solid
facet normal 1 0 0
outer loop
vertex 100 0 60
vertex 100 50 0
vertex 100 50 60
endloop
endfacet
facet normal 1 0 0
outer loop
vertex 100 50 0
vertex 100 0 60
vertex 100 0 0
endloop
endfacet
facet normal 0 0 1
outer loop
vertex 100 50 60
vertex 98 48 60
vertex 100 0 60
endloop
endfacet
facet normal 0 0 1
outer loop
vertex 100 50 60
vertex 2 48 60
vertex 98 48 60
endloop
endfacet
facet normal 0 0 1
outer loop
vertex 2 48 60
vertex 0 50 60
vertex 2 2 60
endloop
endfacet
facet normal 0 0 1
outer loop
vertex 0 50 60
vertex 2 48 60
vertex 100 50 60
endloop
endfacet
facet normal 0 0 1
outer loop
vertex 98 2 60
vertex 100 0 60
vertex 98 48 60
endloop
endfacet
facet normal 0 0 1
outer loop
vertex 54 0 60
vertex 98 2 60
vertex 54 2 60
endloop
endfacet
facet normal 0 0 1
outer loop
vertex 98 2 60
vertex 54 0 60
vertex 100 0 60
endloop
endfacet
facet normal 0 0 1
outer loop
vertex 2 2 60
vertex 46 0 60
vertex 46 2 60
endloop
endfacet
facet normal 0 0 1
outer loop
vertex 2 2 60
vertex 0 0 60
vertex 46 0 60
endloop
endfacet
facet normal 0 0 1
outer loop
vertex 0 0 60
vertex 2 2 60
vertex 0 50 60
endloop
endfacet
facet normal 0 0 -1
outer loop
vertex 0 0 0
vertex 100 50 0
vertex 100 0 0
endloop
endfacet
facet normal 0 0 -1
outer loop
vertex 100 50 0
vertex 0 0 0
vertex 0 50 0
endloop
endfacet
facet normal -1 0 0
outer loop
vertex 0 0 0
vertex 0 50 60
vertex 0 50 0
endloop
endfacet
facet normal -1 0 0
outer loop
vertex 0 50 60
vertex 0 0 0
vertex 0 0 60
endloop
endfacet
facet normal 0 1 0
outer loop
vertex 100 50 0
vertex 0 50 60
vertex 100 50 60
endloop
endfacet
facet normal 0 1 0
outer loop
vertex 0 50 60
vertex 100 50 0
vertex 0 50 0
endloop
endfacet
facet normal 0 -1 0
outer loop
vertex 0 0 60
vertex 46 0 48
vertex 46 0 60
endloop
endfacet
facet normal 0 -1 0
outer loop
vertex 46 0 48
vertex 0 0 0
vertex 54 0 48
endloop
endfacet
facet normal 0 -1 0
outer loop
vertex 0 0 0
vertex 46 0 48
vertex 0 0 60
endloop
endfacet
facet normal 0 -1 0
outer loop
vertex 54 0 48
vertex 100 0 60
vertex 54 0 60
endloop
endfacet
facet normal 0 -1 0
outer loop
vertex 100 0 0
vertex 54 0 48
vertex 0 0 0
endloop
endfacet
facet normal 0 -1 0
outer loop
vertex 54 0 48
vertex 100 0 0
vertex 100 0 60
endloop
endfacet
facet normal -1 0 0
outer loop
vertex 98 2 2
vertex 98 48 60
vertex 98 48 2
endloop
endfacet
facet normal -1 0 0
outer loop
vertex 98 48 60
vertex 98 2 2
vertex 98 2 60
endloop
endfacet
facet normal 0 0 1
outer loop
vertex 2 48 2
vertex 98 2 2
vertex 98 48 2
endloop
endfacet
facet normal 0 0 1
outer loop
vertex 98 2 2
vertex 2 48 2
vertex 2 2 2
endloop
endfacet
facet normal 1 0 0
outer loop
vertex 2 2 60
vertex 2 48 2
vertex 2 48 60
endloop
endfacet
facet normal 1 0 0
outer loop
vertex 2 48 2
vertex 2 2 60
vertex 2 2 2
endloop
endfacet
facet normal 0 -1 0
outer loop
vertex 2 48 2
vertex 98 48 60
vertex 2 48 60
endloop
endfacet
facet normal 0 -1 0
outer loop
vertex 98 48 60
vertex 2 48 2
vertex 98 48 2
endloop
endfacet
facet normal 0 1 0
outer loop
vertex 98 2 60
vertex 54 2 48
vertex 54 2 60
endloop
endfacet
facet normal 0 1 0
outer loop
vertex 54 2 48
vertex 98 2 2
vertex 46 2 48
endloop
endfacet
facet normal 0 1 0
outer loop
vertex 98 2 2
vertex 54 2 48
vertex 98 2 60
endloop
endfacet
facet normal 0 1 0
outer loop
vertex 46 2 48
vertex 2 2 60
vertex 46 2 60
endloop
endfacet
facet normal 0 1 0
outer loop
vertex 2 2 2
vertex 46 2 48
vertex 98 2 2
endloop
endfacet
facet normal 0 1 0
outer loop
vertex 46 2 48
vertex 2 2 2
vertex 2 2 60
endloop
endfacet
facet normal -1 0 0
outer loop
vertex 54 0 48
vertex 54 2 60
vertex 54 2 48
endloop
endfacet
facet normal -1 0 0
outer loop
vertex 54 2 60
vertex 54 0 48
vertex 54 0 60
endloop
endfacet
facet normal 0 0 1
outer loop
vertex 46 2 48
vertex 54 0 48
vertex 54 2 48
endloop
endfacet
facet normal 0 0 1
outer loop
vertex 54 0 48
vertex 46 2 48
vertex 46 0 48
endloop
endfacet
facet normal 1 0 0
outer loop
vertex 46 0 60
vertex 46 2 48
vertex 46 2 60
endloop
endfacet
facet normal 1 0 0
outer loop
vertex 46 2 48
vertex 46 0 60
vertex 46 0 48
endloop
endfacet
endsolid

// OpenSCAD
$fn = 32;

// ----------------------------------------------------------------------
// Enclosure box: notch enclosure
// ----------------------------------------------------------------------

// --- parameters (mm) ---
box_l = 100;              // outer length, X
box_w = 50;               // outer width, Y
box_h = 60;               // outer height
wall_t = 2;               // wall thickness
notch_w = 8;              // cable notch width
notch_h = 12;             // cable notch height
fit_tol = 0.05;           // tolerance for press fits, mm
free_tol = 0.2;           // tolerance for clearance fits, mm

inner_h = box_h - wall_t;  // cavity depth
boss_h = inner_h - 2;  // corner boss height

difference() {
  union() {
    difference() {
      cube([box_l, box_w, box_h]);
      translate([wall_t, wall_t, wall_t])
        cube([box_l - 2 * wall_t, box_w - 2 * wall_t, box_h]);
    }
  }
  translate([box_l / 2 - notch_w / 2, -1, box_h - notch_h])
    cube([notch_w, wall_t + 2, notch_h + 1]);
}
